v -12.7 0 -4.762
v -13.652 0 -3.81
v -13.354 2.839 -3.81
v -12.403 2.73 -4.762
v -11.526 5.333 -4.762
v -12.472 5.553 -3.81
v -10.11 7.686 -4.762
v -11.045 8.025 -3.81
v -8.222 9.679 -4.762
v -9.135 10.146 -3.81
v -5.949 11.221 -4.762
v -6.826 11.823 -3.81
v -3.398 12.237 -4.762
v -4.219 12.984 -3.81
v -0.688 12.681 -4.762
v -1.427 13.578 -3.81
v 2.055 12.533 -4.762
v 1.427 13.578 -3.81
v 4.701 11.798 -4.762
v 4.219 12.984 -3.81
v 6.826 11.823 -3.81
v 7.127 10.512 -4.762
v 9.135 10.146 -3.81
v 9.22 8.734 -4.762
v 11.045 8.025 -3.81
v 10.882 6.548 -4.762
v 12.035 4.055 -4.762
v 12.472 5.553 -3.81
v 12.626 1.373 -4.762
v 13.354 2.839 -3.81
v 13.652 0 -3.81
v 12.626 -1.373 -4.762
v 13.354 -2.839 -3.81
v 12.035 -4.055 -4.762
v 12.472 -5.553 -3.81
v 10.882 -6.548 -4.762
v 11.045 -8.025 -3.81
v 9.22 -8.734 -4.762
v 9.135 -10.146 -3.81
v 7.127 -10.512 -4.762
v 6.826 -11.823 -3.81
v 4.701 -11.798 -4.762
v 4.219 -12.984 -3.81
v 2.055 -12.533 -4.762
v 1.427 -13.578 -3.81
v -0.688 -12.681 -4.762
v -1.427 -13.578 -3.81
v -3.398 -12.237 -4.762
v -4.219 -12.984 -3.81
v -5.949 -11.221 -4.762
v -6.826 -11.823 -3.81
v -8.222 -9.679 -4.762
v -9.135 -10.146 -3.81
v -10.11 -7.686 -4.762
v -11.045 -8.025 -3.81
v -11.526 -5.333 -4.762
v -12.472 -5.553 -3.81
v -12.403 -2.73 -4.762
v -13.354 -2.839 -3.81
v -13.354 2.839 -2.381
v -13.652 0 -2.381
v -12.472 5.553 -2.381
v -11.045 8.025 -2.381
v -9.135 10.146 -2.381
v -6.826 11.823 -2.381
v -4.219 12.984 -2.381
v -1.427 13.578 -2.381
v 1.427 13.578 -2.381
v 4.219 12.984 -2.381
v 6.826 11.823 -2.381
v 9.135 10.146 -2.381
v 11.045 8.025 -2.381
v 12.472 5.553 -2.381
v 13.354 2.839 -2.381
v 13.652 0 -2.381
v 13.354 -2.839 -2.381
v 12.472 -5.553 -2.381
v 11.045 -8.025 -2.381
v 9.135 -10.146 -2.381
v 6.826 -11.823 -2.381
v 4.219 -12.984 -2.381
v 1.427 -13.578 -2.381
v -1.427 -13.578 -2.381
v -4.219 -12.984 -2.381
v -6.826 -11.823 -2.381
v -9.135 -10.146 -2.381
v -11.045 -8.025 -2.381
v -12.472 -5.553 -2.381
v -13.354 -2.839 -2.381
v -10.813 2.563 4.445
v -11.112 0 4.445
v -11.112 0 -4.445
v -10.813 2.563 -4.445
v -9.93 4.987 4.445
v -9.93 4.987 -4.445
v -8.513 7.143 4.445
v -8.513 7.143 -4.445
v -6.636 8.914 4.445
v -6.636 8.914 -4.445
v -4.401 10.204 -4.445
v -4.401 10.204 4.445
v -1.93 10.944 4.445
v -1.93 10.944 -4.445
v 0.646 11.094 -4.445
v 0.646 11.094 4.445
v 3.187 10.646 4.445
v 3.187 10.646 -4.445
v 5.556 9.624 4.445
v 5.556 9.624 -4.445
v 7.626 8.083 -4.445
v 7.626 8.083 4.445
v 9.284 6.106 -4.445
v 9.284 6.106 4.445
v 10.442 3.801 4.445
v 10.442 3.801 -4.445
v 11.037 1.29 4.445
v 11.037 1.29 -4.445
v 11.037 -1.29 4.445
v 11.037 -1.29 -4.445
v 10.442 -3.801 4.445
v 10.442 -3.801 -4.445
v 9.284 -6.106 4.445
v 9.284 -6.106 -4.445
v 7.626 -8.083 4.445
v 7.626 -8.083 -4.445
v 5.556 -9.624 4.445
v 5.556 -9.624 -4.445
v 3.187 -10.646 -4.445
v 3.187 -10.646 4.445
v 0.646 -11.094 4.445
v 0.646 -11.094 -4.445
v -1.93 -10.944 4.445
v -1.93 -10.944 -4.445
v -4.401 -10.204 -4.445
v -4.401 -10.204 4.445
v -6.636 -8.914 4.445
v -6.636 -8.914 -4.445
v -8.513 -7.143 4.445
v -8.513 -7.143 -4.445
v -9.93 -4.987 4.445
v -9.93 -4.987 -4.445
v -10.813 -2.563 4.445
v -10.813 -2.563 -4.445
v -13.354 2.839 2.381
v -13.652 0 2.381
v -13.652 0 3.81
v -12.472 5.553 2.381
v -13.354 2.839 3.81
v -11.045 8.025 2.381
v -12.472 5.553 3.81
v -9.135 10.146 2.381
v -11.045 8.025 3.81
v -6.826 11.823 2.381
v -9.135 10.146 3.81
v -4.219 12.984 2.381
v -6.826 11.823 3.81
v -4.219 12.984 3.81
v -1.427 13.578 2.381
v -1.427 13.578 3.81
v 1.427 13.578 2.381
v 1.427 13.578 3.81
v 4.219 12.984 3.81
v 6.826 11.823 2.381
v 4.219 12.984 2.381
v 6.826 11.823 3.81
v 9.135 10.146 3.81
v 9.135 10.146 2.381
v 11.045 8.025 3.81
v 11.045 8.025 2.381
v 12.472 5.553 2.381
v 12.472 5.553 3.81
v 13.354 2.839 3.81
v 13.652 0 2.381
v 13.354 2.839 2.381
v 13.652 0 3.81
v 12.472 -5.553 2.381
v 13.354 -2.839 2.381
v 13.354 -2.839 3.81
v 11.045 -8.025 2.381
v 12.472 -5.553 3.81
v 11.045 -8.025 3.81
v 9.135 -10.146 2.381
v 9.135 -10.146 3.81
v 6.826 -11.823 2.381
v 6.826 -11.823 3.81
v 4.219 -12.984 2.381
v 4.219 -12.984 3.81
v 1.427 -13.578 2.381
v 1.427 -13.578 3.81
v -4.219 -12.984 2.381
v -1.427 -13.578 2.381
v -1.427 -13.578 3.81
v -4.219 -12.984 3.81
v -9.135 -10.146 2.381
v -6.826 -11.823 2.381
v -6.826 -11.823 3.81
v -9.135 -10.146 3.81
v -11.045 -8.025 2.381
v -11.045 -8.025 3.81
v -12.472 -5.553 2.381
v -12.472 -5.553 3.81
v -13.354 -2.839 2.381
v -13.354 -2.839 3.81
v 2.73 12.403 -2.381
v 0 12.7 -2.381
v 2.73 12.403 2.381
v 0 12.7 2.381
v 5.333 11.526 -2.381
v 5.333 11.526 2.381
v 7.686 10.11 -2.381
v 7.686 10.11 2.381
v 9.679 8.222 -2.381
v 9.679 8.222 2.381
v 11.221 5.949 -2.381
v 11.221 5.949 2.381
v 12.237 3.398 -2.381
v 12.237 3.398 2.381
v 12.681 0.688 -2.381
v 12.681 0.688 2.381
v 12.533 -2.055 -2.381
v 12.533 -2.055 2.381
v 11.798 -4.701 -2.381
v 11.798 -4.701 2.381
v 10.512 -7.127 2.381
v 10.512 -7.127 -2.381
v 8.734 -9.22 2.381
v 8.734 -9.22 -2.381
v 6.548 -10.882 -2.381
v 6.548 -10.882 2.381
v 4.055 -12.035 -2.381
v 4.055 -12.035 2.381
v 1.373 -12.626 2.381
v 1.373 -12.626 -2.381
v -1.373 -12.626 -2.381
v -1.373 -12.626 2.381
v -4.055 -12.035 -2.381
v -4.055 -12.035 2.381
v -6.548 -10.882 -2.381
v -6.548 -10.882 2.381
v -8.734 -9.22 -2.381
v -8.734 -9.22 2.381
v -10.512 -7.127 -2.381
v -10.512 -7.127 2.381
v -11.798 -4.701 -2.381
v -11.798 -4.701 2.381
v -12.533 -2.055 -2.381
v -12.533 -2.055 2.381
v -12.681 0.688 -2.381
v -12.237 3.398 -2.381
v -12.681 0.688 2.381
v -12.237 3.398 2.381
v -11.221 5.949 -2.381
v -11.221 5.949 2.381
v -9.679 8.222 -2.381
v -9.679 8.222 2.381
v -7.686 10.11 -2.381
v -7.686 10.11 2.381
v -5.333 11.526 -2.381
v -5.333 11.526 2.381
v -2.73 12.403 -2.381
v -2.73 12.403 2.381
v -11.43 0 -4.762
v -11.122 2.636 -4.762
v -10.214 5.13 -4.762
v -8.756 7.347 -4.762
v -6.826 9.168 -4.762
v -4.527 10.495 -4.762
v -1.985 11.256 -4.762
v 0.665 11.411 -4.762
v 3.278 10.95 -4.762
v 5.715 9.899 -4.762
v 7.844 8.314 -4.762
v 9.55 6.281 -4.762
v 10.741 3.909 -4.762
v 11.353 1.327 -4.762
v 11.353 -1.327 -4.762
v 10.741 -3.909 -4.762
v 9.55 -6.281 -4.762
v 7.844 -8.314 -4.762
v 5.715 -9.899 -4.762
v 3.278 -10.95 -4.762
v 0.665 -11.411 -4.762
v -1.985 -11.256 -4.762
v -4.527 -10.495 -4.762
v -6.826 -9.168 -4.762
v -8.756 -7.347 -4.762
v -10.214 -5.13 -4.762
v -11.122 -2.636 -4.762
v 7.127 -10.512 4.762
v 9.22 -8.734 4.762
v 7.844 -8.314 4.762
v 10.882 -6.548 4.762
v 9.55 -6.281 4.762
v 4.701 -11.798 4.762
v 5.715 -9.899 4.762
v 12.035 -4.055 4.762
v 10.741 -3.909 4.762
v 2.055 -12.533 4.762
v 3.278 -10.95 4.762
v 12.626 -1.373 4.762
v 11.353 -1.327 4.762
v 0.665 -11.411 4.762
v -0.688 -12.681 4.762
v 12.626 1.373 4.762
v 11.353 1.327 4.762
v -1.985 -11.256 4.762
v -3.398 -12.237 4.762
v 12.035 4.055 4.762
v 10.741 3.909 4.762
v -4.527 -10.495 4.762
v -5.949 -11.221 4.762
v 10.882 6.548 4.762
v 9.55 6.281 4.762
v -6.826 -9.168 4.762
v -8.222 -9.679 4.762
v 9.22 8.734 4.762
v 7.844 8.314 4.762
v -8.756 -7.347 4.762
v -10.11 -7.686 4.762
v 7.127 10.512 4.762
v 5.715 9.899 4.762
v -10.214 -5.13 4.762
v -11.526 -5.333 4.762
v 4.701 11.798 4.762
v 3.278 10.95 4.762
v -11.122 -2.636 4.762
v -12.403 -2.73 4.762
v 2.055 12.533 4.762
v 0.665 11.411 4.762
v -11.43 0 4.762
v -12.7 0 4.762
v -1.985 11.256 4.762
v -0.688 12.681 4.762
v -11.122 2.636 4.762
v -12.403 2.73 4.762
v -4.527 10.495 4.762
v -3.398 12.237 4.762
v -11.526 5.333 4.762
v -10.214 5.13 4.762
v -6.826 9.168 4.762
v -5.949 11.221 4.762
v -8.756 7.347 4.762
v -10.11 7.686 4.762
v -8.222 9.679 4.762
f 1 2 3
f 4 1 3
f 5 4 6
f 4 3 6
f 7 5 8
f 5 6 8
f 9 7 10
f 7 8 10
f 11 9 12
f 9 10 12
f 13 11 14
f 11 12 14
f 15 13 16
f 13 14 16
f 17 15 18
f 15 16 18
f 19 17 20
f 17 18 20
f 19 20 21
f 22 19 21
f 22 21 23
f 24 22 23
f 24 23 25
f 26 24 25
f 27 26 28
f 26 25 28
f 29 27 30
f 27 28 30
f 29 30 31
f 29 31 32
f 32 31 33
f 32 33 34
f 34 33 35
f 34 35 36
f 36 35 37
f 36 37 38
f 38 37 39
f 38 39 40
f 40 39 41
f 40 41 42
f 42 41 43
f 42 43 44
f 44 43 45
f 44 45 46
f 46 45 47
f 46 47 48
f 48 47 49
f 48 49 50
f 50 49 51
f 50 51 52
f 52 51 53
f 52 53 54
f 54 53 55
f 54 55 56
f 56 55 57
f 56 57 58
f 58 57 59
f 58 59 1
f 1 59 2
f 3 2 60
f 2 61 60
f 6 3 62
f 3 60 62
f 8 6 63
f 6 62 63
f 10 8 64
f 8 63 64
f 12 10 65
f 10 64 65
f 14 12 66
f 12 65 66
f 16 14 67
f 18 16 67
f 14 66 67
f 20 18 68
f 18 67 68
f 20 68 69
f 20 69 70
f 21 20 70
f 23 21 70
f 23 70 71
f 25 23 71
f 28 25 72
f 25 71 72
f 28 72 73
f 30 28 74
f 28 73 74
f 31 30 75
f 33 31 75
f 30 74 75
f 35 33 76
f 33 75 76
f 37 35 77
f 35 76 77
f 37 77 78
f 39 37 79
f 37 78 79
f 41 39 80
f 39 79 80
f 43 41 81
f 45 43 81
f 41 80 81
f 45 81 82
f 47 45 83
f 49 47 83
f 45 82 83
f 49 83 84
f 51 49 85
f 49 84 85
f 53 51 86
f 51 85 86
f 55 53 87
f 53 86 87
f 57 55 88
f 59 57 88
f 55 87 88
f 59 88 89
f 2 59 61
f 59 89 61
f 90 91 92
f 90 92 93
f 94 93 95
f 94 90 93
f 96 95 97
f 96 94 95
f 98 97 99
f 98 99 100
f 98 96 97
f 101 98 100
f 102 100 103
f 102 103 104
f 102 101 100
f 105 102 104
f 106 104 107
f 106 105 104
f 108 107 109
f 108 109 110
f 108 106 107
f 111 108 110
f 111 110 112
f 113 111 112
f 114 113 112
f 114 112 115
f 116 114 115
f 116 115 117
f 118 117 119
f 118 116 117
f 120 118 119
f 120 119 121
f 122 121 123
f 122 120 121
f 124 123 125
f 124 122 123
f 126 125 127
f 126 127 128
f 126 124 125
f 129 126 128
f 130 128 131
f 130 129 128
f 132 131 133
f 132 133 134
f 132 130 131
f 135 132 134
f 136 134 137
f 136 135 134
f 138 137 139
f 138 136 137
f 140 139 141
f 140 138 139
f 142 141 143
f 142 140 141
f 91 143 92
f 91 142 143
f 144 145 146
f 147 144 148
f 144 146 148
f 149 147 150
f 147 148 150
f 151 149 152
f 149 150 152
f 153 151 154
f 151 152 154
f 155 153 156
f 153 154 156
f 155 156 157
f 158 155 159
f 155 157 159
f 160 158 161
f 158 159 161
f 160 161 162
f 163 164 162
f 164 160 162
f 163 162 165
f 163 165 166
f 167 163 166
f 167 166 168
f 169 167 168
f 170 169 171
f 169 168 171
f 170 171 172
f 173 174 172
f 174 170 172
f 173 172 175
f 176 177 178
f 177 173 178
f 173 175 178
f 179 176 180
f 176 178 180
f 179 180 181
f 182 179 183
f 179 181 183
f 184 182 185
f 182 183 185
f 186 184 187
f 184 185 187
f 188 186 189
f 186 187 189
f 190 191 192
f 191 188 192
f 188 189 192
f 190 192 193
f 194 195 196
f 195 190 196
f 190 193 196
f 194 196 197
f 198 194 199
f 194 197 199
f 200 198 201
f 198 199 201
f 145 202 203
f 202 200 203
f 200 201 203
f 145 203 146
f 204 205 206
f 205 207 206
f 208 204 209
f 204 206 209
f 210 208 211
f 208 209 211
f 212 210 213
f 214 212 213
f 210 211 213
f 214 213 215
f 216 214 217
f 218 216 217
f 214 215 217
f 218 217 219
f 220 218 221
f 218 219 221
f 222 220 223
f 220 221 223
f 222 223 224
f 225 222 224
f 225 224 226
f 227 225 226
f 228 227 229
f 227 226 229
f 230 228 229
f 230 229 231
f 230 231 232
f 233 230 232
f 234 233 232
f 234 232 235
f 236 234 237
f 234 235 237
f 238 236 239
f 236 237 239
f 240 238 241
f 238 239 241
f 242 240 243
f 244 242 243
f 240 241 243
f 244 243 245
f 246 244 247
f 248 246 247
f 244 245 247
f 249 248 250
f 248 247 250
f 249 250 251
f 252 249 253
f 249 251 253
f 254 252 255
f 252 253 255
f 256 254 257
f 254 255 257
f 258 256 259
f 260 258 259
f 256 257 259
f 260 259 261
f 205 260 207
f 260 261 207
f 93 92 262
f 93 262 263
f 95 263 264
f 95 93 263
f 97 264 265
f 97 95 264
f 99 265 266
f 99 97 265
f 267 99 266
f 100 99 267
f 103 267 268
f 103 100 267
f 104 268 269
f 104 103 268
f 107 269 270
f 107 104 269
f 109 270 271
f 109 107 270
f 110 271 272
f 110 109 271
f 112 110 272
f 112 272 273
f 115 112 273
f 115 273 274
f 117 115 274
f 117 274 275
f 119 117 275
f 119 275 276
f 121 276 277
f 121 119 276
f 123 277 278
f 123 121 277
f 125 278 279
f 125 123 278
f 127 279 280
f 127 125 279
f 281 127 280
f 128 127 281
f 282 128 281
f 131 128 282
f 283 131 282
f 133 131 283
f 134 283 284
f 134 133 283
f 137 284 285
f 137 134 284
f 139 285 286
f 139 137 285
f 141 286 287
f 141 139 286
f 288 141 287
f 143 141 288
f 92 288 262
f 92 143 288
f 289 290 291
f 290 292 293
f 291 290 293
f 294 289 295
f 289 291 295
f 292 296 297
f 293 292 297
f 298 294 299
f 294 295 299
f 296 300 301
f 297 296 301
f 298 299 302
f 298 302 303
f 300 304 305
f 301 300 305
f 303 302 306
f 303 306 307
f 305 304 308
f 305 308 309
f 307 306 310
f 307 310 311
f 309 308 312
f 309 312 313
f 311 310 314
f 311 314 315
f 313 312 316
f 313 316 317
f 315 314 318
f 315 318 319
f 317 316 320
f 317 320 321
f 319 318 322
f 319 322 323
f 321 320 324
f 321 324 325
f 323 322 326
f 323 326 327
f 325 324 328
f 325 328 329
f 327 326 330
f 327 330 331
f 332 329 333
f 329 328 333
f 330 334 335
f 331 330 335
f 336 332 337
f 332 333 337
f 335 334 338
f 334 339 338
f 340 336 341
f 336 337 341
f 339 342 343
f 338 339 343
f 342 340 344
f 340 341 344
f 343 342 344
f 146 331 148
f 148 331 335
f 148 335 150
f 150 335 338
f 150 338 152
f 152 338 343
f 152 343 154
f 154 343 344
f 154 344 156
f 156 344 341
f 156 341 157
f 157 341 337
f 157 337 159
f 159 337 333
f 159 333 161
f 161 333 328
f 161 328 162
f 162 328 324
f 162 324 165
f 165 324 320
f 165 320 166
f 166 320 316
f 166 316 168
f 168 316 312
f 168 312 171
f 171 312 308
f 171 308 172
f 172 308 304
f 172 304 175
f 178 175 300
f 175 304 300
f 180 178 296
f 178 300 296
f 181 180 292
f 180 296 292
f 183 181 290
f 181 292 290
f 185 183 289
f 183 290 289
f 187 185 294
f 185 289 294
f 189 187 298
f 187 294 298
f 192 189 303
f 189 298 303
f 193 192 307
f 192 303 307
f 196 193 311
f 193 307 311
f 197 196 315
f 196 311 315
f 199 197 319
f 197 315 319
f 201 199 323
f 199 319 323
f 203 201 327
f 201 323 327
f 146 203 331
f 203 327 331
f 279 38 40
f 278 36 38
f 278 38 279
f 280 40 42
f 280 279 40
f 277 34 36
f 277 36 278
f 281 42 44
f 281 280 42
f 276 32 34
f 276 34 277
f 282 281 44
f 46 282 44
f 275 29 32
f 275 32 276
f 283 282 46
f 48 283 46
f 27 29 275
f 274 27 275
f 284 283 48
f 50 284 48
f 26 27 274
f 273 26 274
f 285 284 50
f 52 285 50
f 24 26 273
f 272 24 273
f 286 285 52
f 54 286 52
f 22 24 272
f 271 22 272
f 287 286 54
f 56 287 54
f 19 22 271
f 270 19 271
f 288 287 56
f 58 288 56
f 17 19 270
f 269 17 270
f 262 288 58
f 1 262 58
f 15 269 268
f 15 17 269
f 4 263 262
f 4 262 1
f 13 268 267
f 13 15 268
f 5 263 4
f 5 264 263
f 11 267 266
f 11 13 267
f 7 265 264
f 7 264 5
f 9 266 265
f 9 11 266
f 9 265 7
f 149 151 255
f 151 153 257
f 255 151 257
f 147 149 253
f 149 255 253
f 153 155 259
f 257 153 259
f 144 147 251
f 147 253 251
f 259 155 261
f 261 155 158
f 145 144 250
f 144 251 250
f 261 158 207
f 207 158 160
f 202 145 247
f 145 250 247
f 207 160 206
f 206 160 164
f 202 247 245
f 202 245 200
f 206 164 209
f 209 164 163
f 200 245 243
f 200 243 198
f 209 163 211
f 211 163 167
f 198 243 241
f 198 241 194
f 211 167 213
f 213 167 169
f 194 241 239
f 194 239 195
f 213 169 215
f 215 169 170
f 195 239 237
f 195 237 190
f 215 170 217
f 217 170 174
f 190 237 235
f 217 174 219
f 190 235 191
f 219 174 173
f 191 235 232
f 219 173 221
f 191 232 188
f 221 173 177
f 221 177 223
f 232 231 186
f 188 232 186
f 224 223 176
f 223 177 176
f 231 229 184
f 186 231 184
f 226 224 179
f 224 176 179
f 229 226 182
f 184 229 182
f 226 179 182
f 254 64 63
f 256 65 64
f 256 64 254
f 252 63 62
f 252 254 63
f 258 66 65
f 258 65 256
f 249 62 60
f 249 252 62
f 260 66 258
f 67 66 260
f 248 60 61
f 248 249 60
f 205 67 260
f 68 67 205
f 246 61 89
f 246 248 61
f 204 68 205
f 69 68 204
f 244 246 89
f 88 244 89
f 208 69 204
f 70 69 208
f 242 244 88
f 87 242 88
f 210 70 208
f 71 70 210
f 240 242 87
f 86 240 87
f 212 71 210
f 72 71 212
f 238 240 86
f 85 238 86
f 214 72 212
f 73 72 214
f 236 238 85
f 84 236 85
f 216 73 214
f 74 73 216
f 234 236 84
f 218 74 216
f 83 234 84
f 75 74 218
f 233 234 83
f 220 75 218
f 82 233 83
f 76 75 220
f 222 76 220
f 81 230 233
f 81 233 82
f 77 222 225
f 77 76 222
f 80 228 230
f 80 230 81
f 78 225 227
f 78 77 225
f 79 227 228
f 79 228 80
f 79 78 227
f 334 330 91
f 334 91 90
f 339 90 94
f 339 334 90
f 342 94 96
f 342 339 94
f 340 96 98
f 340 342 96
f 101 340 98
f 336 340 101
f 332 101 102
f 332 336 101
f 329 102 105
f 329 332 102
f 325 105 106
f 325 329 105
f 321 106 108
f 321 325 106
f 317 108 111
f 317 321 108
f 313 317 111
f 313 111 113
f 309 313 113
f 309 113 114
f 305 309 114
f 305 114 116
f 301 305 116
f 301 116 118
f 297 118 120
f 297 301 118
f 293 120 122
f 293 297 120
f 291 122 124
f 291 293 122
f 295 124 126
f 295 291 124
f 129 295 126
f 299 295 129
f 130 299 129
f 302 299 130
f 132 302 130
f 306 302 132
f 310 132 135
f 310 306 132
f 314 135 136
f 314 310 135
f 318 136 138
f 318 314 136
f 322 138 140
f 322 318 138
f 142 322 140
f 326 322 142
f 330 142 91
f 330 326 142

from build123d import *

# Parameters (mm, degrees)
F0_W    = 2.54
F0_H    = 9.525
F2_SIZE = 0.3175
F3_SIZE = 0.9525
F4_W    = 2.263989
F4_H    = 4.7625


with BuildPart() as f1:
    # F0 (on Front) → F1 (revolve)
    with BuildSketch(Plane.XZ):
        with Locations((-12.3825, 0)):
            Rectangle(F0_W, F0_H)
    revolve(axis=Axis((0, 0, 0), (0, 0, -1)))

    # F2
    f2_edges = [f1.edges().sort_by_distance(p)[0] for p in [
        (11.1125, 0, 4.7625),
        (11.1125, 0, -4.7625),
    ]]
    chamfer(f2_edges, length=F2_SIZE)

    # F3
    f3_edges = [f1.edges().sort_by_distance(p)[0] for p in [
        (13.6525, 0, -4.7625),
        (13.6525, 0, 4.7625),
    ]]
    chamfer(f3_edges, length=F3_SIZE)

    # F4 (on Right) → F5 (revolve, cut)
    with BuildSketch(Plane.YZ):
        with Locations((13.831995, 0)):
            Rectangle(F4_W, F4_H)
    revolve(axis=Axis((0, 0, -0.389769), (0, 0, -1)), mode=Mode.SUBTRACT)


solid = f1.part
